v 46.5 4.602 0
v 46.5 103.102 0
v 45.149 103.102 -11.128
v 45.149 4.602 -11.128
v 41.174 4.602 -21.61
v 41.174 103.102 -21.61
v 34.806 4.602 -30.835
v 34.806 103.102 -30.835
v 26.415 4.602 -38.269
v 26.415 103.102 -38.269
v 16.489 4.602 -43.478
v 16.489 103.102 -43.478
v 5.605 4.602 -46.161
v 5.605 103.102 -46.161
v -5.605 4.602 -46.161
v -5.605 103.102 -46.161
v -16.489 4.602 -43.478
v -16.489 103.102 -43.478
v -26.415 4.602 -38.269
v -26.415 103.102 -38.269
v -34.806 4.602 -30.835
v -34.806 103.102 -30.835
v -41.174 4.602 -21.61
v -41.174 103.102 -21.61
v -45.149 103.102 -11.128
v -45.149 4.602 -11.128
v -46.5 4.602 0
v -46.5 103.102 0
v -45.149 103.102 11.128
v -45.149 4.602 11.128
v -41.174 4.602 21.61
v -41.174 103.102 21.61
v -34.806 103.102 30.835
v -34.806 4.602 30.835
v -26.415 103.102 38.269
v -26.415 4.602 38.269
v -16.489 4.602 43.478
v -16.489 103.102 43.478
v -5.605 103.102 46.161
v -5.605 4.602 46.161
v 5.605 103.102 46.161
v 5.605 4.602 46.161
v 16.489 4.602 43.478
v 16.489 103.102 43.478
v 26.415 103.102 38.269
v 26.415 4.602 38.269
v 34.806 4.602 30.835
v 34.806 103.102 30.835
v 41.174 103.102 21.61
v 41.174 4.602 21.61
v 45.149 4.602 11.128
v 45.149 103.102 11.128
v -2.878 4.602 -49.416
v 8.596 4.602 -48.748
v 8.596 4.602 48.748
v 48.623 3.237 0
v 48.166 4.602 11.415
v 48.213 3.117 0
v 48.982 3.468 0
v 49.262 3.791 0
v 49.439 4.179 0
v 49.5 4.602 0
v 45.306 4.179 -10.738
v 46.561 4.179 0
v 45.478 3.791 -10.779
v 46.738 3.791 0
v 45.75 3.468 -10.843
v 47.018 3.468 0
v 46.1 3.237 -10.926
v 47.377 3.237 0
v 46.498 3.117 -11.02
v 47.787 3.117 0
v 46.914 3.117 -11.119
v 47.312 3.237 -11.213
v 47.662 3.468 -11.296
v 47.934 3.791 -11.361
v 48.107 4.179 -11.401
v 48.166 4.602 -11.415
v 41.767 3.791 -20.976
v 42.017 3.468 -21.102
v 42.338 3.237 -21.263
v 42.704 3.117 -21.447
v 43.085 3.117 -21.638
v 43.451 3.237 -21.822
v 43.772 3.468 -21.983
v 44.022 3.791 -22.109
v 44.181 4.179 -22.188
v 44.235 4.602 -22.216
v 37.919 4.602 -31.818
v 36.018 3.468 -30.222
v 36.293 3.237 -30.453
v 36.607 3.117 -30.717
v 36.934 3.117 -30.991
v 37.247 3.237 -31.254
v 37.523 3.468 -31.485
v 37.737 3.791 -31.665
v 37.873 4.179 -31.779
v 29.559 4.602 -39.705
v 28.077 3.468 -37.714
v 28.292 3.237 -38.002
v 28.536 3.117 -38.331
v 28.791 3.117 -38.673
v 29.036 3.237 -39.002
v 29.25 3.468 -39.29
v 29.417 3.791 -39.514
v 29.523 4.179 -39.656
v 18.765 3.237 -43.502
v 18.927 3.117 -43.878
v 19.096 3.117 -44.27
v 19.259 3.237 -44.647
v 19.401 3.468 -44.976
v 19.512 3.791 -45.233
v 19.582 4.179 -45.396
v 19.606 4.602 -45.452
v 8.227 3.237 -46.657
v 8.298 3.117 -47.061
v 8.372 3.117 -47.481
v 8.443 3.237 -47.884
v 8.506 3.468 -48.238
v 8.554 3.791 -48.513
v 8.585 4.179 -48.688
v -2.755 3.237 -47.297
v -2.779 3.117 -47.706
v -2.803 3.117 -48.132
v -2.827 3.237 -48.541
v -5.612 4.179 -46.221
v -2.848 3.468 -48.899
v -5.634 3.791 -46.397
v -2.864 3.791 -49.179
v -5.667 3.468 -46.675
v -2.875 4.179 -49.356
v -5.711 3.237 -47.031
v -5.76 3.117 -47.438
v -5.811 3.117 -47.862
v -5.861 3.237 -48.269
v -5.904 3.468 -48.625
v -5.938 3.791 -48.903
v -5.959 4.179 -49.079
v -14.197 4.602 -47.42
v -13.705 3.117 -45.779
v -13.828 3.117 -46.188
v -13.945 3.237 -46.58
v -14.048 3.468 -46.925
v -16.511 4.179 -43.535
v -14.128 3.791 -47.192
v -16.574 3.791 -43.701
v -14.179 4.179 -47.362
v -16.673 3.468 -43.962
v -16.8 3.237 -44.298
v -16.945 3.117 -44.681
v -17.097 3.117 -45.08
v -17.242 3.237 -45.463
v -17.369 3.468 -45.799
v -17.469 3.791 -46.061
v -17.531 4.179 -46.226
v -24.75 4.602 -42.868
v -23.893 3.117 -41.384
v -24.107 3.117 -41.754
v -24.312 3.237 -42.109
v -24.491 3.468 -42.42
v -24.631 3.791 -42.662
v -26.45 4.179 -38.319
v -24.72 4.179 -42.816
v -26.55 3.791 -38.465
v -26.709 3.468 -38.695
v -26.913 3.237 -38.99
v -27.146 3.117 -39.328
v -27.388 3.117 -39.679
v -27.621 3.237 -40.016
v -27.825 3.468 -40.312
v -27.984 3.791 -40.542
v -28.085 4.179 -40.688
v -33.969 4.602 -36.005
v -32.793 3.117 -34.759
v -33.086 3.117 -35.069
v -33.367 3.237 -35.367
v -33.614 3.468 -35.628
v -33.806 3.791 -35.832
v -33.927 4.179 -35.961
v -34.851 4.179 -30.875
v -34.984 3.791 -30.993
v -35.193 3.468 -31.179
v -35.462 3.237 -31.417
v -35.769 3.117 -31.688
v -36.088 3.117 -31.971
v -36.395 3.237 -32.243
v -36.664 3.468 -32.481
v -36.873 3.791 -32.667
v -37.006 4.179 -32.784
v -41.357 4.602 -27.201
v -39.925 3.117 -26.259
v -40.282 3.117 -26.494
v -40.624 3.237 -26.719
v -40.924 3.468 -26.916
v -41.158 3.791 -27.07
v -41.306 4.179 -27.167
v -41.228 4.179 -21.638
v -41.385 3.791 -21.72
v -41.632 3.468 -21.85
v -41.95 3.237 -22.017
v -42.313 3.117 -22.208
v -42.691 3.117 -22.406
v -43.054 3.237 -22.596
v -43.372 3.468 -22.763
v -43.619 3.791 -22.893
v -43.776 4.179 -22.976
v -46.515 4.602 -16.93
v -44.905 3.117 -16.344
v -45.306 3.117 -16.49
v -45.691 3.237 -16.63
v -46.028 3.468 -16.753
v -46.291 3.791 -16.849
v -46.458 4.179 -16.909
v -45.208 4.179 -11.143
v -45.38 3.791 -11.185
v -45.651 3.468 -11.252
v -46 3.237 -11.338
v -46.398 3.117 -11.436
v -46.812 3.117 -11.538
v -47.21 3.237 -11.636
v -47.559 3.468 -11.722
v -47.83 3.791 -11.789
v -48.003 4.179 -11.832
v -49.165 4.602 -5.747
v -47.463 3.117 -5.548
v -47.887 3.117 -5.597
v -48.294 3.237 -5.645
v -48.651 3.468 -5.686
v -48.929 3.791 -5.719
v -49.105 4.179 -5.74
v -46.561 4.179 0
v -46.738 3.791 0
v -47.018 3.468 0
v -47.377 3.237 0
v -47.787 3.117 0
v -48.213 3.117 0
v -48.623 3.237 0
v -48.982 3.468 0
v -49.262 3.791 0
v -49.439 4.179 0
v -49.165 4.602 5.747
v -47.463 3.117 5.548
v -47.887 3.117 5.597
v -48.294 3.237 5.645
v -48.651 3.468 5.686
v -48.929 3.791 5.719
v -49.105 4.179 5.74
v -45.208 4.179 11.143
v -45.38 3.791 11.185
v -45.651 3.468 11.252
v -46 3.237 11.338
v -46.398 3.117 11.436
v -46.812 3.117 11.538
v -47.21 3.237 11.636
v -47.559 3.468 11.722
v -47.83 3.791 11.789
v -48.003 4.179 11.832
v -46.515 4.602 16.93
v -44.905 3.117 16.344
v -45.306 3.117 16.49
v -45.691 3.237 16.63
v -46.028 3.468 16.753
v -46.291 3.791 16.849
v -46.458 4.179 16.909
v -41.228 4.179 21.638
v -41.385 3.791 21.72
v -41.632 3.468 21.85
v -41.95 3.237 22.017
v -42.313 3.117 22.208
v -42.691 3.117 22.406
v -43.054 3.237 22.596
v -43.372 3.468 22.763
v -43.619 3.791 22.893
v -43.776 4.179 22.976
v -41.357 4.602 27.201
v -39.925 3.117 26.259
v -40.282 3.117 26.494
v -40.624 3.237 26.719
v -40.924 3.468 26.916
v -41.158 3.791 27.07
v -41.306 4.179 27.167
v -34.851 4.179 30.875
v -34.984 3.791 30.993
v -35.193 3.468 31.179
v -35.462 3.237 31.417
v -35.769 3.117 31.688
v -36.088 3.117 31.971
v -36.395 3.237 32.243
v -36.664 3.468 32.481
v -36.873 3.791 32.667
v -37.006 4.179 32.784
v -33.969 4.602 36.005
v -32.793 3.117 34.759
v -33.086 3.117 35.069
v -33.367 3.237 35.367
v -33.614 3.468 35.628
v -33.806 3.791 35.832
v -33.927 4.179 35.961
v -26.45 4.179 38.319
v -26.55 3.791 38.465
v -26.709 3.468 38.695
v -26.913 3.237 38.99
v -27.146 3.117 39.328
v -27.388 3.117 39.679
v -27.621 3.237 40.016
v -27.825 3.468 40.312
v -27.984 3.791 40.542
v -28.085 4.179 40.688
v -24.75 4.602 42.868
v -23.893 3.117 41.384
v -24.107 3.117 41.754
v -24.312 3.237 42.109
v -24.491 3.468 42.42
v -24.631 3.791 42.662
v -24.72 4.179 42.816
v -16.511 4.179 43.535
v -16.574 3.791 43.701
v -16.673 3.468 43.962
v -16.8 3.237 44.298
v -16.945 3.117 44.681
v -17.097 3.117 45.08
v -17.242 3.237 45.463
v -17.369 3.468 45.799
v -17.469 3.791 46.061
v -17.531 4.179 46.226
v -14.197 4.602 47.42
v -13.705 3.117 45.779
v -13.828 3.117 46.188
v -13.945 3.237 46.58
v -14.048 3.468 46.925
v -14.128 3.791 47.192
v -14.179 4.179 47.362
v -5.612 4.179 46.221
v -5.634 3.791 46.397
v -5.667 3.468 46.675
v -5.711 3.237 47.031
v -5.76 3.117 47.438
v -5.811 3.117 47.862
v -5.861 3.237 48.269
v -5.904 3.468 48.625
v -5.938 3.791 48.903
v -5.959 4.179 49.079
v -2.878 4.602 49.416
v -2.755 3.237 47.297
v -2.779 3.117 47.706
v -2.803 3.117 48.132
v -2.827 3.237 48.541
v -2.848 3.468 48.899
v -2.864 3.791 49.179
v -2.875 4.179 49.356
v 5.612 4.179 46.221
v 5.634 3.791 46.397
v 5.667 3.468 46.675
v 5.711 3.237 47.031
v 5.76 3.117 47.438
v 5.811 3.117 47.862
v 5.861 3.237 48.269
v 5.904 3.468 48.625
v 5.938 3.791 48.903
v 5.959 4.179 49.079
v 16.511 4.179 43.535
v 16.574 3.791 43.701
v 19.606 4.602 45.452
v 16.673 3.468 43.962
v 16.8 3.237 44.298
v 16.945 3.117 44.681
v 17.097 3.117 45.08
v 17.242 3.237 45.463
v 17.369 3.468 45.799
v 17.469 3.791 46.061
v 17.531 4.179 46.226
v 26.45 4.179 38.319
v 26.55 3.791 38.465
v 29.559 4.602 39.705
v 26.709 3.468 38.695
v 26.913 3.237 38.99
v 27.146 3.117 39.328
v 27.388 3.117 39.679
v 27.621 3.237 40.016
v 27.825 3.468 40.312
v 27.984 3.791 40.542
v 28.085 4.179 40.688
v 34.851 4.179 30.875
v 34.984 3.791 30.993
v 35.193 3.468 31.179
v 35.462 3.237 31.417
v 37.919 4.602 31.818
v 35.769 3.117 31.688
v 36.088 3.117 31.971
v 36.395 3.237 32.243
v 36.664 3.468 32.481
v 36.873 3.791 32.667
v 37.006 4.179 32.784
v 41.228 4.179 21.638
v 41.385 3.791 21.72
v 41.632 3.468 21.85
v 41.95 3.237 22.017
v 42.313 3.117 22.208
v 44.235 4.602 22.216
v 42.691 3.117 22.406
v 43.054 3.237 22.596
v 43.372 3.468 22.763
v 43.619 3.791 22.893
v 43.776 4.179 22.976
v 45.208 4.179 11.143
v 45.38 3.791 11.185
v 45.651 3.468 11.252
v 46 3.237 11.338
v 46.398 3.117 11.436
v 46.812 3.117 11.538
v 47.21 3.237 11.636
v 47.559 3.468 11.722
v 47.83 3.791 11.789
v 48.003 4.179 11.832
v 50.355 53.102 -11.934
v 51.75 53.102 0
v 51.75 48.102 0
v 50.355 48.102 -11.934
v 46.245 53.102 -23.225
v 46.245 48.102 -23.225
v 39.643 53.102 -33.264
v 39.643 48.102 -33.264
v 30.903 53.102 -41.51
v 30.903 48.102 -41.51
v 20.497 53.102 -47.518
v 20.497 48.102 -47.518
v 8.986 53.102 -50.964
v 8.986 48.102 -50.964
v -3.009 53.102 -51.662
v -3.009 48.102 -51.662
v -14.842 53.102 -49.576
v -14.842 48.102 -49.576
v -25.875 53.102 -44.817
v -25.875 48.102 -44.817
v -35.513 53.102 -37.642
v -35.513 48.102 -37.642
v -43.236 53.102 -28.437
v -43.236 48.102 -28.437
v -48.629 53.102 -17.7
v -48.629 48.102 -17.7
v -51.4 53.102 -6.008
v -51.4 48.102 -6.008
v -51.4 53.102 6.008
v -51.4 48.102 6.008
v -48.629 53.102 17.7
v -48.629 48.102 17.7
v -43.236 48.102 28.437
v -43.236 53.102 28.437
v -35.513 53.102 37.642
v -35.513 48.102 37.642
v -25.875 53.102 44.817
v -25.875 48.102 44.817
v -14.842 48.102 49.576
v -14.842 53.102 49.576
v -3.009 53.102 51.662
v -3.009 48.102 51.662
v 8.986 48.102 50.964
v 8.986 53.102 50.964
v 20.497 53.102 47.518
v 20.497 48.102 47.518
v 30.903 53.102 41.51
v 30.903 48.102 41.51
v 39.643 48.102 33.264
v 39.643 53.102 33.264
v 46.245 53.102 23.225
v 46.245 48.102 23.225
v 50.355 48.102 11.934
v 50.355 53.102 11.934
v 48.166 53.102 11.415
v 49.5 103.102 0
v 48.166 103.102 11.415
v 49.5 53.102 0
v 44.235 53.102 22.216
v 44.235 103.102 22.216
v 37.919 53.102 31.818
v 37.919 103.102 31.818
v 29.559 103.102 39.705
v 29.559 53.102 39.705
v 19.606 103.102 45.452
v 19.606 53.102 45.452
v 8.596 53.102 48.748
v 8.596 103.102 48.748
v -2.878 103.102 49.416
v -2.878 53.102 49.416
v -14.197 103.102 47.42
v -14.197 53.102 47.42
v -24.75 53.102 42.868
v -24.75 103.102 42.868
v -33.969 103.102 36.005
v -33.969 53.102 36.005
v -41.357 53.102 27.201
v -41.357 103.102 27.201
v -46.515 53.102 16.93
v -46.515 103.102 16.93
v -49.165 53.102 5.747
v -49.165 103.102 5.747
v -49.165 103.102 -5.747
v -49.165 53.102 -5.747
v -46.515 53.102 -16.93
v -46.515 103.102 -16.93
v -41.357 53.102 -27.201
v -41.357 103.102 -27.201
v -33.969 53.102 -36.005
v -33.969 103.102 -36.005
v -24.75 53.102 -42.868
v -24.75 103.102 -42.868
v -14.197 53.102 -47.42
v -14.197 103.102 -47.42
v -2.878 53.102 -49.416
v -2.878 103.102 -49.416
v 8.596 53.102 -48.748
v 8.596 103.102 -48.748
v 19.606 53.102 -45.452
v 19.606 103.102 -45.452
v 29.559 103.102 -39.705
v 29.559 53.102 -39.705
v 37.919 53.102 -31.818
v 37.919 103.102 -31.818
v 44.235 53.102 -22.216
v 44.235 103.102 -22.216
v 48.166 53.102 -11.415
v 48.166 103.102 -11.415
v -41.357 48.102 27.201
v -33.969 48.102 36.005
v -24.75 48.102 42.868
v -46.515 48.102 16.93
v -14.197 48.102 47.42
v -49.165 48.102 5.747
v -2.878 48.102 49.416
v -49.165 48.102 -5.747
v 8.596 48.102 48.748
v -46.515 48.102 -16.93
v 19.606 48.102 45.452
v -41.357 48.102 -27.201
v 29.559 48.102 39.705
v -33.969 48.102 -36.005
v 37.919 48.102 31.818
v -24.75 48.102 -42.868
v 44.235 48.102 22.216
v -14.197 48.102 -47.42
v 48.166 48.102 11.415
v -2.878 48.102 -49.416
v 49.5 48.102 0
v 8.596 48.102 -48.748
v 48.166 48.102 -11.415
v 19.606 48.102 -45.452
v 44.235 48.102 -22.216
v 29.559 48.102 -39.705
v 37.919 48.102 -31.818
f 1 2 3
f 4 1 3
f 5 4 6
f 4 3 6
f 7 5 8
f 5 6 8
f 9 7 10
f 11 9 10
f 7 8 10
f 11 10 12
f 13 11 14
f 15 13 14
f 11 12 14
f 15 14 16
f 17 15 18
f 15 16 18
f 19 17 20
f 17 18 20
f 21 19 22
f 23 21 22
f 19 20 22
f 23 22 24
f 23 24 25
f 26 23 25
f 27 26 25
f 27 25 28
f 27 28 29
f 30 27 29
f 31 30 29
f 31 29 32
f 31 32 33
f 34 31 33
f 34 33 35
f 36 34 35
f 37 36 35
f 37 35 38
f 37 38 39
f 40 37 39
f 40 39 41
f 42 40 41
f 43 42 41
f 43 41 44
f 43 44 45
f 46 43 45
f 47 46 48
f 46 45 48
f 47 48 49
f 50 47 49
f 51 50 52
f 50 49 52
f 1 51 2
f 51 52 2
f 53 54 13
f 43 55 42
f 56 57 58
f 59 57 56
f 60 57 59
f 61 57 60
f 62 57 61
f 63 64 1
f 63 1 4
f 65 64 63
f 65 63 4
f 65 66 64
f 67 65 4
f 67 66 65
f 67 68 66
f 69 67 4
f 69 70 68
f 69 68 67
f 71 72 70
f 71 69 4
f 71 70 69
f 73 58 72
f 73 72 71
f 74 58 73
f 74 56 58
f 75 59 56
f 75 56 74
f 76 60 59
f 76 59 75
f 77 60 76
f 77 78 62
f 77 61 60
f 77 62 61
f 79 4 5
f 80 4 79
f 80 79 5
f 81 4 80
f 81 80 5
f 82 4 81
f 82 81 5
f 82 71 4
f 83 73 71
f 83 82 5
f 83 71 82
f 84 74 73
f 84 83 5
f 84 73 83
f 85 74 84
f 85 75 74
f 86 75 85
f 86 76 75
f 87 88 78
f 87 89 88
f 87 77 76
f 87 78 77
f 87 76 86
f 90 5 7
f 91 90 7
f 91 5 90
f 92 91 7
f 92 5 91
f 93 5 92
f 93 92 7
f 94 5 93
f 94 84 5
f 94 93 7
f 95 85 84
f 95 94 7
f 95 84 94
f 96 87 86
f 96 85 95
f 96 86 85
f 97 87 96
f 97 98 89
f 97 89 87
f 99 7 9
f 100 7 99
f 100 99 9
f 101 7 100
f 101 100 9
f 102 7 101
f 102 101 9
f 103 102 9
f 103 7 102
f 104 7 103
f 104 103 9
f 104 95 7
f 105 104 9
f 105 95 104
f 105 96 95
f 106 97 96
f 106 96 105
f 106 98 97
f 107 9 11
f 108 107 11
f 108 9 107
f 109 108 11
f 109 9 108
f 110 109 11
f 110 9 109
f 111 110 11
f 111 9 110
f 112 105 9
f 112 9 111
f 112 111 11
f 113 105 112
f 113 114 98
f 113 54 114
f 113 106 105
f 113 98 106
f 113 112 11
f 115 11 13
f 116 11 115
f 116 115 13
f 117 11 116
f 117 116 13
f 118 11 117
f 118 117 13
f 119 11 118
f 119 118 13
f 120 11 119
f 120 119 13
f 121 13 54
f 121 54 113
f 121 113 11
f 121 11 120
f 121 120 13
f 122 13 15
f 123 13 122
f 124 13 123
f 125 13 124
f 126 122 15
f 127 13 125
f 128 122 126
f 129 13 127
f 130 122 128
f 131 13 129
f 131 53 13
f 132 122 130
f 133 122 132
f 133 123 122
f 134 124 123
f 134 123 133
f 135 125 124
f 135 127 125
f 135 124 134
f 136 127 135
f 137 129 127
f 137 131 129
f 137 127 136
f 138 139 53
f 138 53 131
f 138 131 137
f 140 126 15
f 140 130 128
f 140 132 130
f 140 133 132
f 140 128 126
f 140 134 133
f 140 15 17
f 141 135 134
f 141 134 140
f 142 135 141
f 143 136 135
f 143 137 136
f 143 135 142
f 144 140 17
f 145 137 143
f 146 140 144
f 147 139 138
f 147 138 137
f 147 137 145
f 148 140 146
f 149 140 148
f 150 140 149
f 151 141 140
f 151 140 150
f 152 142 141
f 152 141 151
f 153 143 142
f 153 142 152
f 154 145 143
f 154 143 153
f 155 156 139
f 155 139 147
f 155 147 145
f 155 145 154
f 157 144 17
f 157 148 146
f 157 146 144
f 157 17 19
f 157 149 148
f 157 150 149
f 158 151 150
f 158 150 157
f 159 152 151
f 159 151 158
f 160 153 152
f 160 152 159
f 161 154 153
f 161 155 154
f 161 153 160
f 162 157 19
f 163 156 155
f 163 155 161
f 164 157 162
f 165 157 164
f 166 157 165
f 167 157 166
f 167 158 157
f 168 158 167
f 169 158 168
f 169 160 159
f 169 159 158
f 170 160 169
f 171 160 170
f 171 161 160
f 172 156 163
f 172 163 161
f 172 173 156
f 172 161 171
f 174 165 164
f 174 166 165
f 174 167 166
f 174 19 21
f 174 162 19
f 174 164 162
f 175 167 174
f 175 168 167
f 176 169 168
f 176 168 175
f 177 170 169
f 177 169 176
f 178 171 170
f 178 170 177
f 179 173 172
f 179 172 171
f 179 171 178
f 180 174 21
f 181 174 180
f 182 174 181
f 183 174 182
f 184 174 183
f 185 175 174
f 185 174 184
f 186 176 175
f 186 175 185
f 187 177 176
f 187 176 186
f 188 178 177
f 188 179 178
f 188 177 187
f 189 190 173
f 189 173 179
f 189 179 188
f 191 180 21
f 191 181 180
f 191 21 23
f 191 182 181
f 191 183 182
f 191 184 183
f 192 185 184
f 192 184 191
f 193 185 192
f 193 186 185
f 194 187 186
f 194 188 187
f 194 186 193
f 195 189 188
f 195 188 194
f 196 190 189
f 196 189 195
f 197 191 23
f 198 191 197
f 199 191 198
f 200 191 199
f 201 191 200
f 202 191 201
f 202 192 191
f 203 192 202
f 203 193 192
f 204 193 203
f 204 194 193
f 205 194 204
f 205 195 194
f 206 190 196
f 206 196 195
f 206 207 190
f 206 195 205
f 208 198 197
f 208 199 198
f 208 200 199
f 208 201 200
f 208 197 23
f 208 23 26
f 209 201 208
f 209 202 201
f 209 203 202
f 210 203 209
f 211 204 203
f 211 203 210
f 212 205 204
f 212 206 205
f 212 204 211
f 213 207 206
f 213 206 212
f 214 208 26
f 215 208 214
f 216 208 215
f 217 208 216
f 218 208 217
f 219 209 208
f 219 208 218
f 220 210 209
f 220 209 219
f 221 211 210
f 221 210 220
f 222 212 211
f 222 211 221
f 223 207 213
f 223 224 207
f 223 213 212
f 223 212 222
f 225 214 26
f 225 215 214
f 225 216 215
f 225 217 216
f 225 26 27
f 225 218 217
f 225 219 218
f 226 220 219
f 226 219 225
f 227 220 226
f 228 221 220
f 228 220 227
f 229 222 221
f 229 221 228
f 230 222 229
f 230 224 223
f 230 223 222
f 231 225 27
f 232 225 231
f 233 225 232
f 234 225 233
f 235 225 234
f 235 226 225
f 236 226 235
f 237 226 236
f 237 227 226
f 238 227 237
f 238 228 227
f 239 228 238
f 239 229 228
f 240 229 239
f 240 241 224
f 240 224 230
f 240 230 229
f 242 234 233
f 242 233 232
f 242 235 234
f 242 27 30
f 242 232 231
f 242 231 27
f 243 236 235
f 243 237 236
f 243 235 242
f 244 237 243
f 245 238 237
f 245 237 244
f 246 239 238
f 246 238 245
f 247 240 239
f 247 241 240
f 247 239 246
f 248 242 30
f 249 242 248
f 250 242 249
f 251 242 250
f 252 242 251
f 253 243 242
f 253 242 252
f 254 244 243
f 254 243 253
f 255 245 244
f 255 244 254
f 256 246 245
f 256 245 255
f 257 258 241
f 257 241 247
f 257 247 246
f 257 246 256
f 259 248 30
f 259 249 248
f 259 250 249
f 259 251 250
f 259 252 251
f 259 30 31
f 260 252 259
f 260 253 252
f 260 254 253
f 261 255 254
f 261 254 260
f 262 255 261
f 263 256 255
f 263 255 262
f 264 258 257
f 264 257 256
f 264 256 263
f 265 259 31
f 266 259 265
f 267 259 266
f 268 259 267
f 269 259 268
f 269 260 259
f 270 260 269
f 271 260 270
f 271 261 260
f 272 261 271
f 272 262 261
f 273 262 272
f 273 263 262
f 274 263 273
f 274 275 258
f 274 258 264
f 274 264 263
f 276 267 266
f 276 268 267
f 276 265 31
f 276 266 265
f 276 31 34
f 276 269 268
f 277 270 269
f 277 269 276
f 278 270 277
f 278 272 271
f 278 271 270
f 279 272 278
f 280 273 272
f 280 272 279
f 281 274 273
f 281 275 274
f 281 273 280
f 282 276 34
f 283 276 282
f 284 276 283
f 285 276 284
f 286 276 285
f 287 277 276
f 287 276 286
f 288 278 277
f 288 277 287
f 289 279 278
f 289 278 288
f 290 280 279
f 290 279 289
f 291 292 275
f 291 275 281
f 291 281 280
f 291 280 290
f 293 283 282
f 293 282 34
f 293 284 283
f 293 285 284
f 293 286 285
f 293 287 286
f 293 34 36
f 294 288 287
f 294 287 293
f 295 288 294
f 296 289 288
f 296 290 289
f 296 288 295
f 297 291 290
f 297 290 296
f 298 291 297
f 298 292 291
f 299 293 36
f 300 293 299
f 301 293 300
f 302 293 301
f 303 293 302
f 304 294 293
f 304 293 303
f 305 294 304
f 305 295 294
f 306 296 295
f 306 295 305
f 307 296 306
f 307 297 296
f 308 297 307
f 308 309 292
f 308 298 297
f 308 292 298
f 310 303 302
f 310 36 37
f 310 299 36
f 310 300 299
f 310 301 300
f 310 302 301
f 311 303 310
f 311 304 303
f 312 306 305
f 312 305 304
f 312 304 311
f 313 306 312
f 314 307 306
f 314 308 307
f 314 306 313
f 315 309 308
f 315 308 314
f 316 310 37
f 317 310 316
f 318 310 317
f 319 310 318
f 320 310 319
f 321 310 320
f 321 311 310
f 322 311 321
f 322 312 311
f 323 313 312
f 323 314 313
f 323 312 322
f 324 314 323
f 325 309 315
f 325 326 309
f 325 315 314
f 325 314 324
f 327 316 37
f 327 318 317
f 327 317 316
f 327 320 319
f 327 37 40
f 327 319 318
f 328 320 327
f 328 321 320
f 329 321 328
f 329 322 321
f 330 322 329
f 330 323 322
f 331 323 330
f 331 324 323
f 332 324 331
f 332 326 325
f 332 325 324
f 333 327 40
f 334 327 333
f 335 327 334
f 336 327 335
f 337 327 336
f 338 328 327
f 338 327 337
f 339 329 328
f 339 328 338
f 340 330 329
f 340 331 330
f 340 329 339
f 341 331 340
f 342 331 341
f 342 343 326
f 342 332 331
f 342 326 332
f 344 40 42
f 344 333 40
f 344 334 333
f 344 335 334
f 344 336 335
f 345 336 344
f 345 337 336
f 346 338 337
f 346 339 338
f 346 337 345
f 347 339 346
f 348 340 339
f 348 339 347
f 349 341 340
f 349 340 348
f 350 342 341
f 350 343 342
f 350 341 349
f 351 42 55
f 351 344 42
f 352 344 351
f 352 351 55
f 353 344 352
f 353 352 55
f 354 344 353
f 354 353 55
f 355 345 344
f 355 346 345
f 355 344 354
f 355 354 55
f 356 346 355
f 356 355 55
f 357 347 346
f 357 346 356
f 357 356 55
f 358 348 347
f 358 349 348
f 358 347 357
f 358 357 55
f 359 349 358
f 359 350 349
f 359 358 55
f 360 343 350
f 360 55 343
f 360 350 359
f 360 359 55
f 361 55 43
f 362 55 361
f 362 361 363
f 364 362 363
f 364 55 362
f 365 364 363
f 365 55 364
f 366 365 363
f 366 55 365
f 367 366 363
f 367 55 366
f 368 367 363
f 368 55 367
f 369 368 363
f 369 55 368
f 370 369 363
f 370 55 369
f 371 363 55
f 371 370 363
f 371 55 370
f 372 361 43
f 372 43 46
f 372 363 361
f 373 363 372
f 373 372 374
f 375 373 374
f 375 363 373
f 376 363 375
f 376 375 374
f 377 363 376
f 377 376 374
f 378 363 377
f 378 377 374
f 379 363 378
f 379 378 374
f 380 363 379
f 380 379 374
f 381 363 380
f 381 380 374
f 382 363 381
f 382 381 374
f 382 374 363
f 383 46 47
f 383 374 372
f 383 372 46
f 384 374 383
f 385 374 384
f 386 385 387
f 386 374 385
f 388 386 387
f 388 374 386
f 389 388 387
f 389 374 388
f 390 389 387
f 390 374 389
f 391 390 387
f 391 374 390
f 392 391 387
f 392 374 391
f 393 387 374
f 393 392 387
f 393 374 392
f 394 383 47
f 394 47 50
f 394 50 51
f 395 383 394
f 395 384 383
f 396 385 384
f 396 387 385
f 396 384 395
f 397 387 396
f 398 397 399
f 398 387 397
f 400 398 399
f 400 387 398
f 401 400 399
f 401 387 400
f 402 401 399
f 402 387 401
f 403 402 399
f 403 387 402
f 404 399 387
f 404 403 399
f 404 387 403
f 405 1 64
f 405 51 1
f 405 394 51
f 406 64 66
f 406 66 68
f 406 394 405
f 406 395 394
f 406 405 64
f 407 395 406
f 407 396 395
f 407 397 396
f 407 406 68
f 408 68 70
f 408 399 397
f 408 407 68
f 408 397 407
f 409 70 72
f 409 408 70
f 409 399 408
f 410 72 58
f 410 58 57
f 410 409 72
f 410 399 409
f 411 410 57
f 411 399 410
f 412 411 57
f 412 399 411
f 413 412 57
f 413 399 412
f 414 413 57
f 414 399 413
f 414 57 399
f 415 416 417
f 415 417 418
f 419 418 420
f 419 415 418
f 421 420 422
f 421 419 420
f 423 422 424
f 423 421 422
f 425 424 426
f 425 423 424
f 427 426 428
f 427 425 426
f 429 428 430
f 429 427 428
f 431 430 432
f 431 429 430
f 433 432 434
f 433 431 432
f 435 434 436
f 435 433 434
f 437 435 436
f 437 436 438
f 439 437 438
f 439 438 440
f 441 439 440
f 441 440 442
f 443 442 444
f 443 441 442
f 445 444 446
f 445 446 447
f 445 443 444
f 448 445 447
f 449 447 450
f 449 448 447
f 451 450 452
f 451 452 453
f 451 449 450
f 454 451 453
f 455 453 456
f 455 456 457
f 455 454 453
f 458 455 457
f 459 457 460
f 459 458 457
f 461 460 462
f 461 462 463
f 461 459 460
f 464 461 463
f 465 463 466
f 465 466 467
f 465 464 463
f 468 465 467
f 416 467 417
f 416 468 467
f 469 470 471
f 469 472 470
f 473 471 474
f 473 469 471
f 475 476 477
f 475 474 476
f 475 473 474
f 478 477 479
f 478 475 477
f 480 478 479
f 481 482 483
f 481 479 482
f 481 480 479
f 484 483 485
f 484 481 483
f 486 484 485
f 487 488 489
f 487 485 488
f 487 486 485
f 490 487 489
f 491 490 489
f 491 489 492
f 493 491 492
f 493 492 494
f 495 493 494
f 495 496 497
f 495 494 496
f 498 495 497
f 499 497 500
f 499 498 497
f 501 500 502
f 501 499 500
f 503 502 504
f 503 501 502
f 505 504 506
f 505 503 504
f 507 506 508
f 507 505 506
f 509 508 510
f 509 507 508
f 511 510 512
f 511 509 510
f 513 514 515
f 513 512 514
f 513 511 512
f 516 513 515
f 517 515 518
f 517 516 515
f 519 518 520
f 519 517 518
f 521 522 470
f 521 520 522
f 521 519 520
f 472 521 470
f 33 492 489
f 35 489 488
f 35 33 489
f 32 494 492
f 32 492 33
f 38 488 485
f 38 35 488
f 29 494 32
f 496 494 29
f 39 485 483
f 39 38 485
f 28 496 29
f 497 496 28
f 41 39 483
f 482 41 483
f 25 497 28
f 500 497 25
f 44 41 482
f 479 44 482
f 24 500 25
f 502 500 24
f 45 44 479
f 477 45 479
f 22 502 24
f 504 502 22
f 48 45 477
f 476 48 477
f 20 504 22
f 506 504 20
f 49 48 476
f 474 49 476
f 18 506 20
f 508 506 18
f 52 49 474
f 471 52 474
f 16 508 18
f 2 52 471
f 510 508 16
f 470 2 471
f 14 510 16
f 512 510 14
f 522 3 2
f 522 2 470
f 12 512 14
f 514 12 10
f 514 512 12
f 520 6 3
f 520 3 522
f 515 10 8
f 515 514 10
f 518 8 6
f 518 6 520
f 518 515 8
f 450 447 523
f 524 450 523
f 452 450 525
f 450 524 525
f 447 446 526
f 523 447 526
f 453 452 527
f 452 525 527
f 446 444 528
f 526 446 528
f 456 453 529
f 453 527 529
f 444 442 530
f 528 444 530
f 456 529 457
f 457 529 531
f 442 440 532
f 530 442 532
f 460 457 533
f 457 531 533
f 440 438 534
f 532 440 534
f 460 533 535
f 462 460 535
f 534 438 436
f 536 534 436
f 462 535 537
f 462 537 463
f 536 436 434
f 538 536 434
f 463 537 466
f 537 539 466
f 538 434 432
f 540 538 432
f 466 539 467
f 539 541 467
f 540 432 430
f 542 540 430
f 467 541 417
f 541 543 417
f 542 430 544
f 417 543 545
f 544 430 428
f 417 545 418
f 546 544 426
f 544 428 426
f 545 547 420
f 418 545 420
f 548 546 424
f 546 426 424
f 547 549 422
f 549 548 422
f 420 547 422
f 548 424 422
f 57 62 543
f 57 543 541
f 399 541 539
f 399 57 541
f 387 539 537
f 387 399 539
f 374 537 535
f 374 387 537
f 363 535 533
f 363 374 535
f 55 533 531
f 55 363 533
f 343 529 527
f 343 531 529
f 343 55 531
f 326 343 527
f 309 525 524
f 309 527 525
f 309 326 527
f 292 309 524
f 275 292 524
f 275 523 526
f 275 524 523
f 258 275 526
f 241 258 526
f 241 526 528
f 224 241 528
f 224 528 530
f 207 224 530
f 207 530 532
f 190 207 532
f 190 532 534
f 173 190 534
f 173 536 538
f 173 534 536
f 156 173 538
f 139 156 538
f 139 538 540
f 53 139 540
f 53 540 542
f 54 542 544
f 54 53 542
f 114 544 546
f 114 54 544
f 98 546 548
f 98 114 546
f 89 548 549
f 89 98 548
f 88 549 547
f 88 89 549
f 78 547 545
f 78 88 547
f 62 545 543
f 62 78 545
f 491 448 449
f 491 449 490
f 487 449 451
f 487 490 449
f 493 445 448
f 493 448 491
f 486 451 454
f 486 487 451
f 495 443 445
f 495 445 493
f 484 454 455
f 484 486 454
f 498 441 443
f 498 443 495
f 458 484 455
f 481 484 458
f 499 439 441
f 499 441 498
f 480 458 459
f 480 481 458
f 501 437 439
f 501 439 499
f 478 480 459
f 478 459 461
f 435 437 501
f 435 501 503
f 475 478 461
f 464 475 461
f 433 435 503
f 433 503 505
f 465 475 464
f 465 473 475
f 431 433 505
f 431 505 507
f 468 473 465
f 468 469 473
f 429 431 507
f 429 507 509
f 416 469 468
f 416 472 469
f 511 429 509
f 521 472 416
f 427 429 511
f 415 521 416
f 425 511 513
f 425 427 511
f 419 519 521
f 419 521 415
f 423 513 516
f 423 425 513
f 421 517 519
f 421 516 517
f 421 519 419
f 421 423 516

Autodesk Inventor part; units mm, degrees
ref_plane "YZ Plane" through (0, 0, 0) normal (1, 0, 0) x (0, 1, 0)
ref_plane "XZ Plane" through (0, 0, 0) normal (0, 1, 0) x (-1, 0, 0)
ref_plane "XY Plane" through (0, 0, 0) normal (0, 0, 1) x (1, 0, 0)
sketch "Sketch1" plane through (0, 0, 0) normal (0, 0, 1) x (1, 0, 0)
  line L0 (0, 0) -> (0, 150)
  line L1 (46.5, 103.1016) -> (49.5, 103.1016)
  line L2 (49.5, 103.1016) -> (49.5, 4.6016)
  line L3 (48, 3.1016) -> (48, 3.1016)
  line L4 (46.5, 4.6016) -> (46.5, 103.1016)
  line L5 (49.5, 48.1016) -> (51.75, 48.1016)
  line L6 (51.75, 48.1016) -> (51.75, 53.1016)
  line L7 (51.75, 53.1016) -> (49.5, 53.1016)
  line L8 (49.5, 53.1016) -> (49.5, 48.1016)
  arc A0 (46.5, 4.6016) -> (48, 3.1016) centre (48, 4.6016) ccw
  arc A1 (48, 3.1016) -> (49.5, 4.6016) centre (48, 4.6016) ccw
  point P0 (49.5, 3.1016)
  point P1 (46.5, 3.1016)
  dimension "d1" = 100
  dimension "d2" = 50
  dimension "d3" = 5
  dimension "d4" = 3
  dimension "d5" = 99
  dimension "d6" = 103.5
  dimension "d8" = 1.5
revolve "Revolution1" add sketch "Sketch1" angle 360 about axis through (0, 0, 0) along (0, 1, 0)
properties part number "pld_bh"
